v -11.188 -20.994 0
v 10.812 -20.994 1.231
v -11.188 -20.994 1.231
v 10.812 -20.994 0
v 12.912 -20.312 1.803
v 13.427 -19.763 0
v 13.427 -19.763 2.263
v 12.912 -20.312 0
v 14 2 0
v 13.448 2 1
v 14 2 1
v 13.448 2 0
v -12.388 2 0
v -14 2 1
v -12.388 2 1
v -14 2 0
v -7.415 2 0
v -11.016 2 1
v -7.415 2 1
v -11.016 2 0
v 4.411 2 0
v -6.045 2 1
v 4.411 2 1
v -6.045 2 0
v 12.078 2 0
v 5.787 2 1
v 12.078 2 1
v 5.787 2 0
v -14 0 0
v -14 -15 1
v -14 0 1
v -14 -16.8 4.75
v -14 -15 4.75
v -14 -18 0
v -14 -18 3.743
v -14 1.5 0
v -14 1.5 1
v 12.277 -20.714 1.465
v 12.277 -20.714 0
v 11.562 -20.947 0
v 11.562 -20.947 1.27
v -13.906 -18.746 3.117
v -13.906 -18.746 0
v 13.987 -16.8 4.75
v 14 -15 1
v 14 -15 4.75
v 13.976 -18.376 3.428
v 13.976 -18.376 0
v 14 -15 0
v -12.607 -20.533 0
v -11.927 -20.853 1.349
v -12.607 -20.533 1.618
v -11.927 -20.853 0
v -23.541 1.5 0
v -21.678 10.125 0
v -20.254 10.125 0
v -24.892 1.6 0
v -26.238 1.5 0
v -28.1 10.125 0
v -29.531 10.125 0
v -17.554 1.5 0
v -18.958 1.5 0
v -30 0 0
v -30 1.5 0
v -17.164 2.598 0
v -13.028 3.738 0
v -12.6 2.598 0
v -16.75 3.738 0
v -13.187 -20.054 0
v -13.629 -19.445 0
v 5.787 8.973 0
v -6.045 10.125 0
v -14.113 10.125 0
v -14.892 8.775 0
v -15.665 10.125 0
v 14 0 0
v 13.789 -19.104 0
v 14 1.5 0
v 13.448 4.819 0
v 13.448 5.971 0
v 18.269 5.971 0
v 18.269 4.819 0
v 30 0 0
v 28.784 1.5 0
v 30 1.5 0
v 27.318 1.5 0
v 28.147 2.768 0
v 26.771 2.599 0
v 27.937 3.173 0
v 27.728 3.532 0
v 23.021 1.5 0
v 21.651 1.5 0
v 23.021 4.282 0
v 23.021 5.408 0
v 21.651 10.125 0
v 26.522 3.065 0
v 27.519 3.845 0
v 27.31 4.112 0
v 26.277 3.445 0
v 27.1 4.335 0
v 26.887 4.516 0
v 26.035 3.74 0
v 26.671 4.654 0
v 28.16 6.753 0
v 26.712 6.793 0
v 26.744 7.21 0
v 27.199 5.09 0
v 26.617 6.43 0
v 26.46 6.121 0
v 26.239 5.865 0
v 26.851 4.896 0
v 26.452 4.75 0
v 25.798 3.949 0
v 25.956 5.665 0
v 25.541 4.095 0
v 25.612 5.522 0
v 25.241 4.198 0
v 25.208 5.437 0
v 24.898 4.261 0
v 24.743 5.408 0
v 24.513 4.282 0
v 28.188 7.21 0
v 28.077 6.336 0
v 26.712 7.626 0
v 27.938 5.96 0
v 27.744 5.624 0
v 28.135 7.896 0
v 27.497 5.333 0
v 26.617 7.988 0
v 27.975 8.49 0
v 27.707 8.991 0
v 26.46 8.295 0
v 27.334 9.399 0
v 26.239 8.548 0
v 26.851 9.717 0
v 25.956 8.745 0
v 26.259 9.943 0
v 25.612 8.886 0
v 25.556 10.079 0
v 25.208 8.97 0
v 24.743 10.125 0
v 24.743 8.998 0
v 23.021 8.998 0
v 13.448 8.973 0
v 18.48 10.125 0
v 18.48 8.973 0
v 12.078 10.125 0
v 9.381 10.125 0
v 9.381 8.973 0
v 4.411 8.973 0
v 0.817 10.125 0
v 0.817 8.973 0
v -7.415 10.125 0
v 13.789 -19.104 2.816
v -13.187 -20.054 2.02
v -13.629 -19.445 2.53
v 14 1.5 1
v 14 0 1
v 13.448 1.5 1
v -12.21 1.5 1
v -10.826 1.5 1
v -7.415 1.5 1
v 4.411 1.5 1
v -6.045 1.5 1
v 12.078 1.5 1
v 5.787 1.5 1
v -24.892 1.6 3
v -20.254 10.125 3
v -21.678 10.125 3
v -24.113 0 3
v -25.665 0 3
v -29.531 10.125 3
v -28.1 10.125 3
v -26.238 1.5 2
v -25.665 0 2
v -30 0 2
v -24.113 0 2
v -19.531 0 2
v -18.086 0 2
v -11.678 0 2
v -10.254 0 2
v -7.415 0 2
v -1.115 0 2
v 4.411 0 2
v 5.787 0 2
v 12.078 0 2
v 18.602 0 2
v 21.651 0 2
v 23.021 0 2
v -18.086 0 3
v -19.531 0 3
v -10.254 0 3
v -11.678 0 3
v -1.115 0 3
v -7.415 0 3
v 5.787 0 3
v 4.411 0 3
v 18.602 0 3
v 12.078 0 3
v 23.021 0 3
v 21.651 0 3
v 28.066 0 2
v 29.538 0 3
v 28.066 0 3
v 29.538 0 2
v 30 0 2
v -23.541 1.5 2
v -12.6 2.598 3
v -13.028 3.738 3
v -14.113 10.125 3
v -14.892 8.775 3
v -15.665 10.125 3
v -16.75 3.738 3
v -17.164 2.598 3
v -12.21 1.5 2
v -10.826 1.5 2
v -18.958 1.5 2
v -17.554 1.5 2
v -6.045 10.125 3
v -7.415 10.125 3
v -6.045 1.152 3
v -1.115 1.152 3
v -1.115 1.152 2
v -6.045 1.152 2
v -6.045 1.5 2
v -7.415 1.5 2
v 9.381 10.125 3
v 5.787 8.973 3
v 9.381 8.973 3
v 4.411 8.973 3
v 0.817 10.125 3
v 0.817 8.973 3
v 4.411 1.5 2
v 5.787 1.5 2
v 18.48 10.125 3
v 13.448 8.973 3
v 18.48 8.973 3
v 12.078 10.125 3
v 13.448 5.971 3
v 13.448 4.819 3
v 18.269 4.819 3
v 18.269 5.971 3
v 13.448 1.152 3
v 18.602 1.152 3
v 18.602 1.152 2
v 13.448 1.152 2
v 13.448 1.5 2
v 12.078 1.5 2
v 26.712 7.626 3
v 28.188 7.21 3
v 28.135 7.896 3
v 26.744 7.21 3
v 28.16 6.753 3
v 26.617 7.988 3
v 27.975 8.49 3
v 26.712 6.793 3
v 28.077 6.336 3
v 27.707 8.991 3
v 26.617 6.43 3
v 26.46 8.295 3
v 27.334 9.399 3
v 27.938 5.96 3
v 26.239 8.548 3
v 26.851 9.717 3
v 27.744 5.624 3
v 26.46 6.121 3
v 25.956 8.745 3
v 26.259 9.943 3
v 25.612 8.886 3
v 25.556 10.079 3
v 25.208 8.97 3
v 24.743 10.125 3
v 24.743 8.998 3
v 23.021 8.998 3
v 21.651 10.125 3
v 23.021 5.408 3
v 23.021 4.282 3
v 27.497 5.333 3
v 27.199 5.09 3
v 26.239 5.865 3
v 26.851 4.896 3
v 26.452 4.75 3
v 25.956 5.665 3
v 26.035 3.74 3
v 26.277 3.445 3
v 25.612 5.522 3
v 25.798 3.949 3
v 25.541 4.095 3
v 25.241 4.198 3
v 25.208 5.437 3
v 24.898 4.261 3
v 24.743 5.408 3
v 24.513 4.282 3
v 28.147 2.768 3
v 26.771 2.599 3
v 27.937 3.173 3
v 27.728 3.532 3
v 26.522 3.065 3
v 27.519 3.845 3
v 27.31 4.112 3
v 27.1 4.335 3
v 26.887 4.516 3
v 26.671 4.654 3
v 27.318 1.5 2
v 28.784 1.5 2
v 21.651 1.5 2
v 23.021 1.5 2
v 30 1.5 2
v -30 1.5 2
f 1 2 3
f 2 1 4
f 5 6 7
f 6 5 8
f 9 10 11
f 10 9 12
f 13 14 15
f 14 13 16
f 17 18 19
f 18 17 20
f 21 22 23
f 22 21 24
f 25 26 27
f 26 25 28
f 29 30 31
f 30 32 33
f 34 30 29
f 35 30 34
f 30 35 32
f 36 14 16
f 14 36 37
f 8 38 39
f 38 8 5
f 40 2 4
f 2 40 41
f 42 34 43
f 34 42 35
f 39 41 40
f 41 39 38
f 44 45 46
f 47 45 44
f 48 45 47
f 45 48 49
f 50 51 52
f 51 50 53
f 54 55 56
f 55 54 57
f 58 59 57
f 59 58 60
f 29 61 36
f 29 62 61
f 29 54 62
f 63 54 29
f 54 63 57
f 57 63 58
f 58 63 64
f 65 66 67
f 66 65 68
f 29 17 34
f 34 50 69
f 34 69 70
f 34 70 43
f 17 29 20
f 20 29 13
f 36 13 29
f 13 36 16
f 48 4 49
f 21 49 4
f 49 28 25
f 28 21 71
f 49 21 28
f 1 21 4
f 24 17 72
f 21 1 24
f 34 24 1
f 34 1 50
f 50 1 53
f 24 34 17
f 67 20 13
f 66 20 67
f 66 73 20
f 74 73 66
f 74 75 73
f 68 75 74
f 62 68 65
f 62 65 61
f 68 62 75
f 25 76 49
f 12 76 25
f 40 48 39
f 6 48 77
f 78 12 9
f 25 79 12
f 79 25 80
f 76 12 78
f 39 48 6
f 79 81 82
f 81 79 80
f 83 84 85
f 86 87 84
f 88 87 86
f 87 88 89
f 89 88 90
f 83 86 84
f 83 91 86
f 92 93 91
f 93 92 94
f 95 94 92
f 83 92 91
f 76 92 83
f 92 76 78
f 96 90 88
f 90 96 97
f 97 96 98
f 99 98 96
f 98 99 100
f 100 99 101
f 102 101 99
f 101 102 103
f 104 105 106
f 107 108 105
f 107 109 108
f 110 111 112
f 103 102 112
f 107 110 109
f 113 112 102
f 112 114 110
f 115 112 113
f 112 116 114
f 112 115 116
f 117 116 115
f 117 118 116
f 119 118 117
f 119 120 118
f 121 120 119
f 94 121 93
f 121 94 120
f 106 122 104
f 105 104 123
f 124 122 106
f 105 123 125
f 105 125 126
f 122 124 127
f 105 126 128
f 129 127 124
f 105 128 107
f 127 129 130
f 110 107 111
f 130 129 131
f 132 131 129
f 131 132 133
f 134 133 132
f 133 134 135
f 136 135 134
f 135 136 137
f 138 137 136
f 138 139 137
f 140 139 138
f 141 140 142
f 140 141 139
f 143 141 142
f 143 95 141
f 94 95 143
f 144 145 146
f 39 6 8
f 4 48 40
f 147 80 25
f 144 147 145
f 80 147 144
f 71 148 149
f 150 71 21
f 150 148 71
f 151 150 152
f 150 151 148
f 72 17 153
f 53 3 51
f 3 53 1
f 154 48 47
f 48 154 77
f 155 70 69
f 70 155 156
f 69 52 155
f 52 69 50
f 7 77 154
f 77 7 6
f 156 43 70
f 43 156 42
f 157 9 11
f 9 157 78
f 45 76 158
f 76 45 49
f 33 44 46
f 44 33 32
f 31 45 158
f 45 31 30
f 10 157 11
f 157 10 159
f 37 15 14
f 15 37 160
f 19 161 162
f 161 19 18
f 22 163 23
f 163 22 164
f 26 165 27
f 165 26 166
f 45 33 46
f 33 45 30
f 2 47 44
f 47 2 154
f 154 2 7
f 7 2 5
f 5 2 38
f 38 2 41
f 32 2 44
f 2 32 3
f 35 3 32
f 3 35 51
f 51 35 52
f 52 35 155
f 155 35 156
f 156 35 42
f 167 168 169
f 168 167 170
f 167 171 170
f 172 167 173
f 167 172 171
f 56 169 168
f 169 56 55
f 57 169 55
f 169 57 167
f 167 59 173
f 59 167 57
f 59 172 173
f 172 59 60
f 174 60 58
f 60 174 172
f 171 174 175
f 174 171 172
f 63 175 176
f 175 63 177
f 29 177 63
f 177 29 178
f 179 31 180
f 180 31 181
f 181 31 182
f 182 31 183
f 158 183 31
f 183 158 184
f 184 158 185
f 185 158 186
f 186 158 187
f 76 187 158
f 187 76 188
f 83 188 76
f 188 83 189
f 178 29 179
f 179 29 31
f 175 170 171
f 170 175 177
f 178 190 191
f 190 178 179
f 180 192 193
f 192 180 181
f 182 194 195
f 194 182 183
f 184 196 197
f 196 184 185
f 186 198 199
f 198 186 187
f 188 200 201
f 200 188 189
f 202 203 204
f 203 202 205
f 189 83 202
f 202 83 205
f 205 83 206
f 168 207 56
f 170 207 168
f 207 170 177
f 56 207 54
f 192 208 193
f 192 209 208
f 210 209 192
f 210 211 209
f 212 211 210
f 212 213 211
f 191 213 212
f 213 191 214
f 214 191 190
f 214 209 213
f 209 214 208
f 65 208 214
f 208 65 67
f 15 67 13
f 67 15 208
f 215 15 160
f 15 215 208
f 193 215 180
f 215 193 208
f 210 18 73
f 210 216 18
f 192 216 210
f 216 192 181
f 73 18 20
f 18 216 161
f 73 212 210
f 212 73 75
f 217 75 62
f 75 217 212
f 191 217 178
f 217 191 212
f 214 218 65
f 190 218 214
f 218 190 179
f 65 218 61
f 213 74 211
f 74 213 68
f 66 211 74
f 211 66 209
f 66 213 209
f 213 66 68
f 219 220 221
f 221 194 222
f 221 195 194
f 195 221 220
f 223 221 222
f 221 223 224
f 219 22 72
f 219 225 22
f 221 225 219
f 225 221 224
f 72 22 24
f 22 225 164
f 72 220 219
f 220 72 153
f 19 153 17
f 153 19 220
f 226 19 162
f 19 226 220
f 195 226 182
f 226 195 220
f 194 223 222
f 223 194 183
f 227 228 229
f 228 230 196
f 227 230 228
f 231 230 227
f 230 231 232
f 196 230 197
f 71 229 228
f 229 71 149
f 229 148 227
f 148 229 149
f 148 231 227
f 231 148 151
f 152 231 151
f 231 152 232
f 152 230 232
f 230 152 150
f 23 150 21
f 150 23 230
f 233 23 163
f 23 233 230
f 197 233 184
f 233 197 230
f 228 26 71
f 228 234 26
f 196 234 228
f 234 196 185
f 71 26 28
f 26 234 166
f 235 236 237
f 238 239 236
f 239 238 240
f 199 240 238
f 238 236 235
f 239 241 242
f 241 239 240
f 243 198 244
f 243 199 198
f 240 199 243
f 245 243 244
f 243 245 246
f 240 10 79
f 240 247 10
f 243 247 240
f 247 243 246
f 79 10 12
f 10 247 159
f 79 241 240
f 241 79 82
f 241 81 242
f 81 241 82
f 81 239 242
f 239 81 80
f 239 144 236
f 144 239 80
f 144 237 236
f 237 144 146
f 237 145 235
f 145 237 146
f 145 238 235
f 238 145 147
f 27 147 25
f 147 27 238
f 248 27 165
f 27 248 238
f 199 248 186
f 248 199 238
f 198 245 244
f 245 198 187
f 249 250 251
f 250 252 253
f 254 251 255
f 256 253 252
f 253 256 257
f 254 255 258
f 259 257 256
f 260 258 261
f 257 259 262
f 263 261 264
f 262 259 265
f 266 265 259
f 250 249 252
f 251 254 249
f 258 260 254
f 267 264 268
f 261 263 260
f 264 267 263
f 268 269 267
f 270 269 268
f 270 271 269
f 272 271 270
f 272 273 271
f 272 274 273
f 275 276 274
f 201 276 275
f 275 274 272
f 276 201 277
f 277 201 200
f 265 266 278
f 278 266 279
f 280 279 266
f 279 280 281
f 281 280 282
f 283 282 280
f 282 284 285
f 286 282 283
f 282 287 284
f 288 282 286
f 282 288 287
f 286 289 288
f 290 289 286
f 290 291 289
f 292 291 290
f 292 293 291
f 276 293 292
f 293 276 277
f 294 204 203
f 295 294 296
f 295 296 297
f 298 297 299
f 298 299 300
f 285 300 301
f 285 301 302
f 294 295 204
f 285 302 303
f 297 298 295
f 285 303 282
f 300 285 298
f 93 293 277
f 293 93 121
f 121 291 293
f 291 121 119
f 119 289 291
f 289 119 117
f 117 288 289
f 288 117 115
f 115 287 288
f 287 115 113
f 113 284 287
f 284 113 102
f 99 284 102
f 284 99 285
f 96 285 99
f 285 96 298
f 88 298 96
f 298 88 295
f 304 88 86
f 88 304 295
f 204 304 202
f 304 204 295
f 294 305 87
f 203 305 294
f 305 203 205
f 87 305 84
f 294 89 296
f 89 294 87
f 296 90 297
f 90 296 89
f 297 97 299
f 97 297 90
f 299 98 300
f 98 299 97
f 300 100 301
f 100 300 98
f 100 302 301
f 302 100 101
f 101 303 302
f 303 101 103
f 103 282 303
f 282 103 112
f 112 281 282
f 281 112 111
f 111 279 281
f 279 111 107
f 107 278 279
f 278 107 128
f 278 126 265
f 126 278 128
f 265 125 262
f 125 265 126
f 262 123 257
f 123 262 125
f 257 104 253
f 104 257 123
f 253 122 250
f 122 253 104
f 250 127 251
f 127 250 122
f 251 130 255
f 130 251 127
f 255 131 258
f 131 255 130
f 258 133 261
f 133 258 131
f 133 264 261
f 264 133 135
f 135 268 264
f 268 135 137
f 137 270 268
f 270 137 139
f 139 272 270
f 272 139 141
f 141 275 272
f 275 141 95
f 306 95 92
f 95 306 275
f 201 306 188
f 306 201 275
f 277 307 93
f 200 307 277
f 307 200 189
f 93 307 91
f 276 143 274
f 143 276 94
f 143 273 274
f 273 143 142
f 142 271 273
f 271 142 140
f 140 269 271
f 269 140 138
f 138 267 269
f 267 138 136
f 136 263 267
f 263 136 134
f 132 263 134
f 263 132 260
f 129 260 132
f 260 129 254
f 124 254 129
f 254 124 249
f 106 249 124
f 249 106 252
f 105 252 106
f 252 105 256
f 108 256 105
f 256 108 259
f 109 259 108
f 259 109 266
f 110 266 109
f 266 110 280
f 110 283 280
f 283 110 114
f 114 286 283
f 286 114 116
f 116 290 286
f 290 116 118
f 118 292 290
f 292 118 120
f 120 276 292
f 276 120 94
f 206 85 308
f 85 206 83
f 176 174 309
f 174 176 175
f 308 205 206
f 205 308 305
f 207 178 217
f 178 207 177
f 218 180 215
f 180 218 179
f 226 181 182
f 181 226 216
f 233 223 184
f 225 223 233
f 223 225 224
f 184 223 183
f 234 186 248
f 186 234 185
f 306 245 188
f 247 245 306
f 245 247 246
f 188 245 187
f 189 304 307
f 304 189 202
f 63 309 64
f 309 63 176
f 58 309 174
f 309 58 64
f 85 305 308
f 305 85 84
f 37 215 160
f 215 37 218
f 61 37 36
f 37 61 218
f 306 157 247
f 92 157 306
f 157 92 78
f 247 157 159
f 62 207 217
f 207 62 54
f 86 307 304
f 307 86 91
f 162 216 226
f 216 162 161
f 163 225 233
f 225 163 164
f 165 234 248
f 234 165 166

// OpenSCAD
//Hardhat accessory slot tab
//Writen by Dan Koss 1/2016. (Updated 1/23/16)
//Thanks to MC Geisler (thing:714444) for the font list. I'm still figuring out text and will trim don the list as I learn.
//Choose to import STL or Use custom text

/* [Add Text] */
//Text Line 1
line1 = "";
//Text Line 2
line2 = "";
//Text Line 3
line3 = "";
//Text Line 4
line4 = "VALTER";

//Font name, e.g. "Libration Sans", "Aldo", depends on what is available on the platform. In the customizer,choose from about 700 Google Fonts. For an overview please refer: http://www.google.com/fonts
FontName="Orbitron"; //[ABeeZee,Abel,Abril Fatface,Aclonica,Acme,Actor,Adamina,Advent Pro,Aguafina Script,Akronim,Aladin,Aldrich,Alef,Alegreya,Alegreya Sans,Alegreya Sans SC,Alegreya SC,Alex Brush,Alfa Slab One,Alice,Alike,Alike Angular,Allan,Allerta,Allerta Stencil,Allura,Almendra,Almendra Display,Almendra SC,Amarante,Amaranth,Amatic SC,Amethysta,Amiri,Anaheim,Andada,Andika,Angkor,Annie Use Your Telescope,Anonymous Pro,Antic,Antic Didone,Antic Slab,Anton,Arapey,Arbutus,Arbutus Slab,Architects Daughter,Archivo Black,Archivo Narrow,Arimo,Arizonia,Armata,Artifika,Arvo,Asap,Asset,Astloch,Asul,Atomic Age,Aubrey,Audiowide,Autour One,Average,Average Sans,Averia Gruesa Libre,Averia Libre,Averia Sans Libre,Averia Serif Libre,Bad Script,Balthazar,Bangers,Basic,Battambang,Baumans,Bayon,Belgrano,Belleza,BenchNine,Bentham,Berkshire Swash,Bevan,Bigelow Rules,Bigshot One,Bilbo,Bilbo Swash Caps,Bitter,Black Ops One,Bokor,Bonbon,Boogaloo,Bowlby One,Bowlby One SC,Brawler,Bree Serif,Bubblegum Sans,Bubbler One,Buda,Buenard,Butcherman,Butterfly Kids,Cabin,Cabin Condensed,Cabin Sketch,Caesar Dressing,Cagliostro,Calligraffitti,Cambay,Cambo,Candal,Cantarell,Cantata One,Cantora One,Capriola,Cardo,Carme,Carrois Gothic,Carrois Gothic SC,Carter One,Caudex,Cedarville Cursive,Ceviche One,Changa One,Chango,Chau Philomene One,Chela One,Chelsea Market,Chenla,Cherry Cream Soda,Cherry Swash,Chewy,Chicle,Chivo,Cinzel,Cinzel Decorative,Clicker Script,Coda,Coda Caption,Codystar,Combo,Comfortaa,Coming Soon,Concert One,Condiment,Content,Contrail One,Convergence,Cookie,Copse,Corben,Courgette,Cousine,Coustard,Covered By Your Grace,Crafty Girls,Creepster,Crete Round,Crimson Text,Croissant One,Crushed,Cuprum,Cutive,Cutive Mono,Damion,Dancing Script,Dangrek,Dawning of a New Day,Days One,Dekko,Delius,Delius Swash Caps,Delius Unicase,Della Respira,Denk One,Devonshire,Dhurjati,Didact Gothic,Diplomata,Diplomata SC,Domine,Donegal One,Doppio One,Dorsa,Dosis,Dr Sugiyama,Droid Sans,Droid Sans Mono,Droid Serif,Duru Sans,Dynalight,Eagle Lake,Eater,EB Garamond,Economica,Ek Mukta,Electrolize,Elsie,Elsie Swash Caps,Emblema One,Emilys Candy,Engagement,Englebert,Enriqueta,Erica One,Esteban,Euphoria Script,Ewert,Exo,Exo 2,Expletus Sans,Fanwood Text,Fascinate,Fascinate Inline,Faster One,Fasthand,Fauna One,Federant,Federo,Felipa,Fenix,Finger Paint,Fira Mono,Fira Sans,Fjalla One,Fjord One,Flamenco,Flavors,Fondamento,Fontdiner Swanky,Forum,Francois One,Freckle Face,Fredericka the Great,Fredoka One,Freehand,Fresca,Frijole,Fruktur,Fugaz One,Gabriela,Gafata,Galdeano,Galindo,Gentium Basic,Gentium Book Basic,Geo,Geostar,Geostar Fill,Germania One,GFS Didot,GFS Neohellenic,Gidugu,Gilda Display,Give You Glory,Glass Antiqua,Glegoo,Gloria Hallelujah,Goblin One,Gochi Hand,Gorditas,Goudy Bookletter 1911,Graduate,Grand Hotel,Gravitas One,Great Vibes,Griffy,Gruppo,Gudea,Gurajada,Habibi,Halant,Hammersmith One,Hanalei,Hanalei Fill,Handlee,Hanuman,Happy Monkey,Headland One,Henny Penny,Herr Von Muellerhoff,Hind,Holtwood One SC,Homemade Apple,Homenaje,Iceberg,Iceland,IM Fell Double Pica,IM Fell Double Pica SC,IM Fell DW Pica,IM Fell DW Pica SC,IM Fell English,IM Fell English SC,IM Fell French Canon,IM Fell French Canon SC,IM Fell Great Primer,IM Fell Great Primer SC,Imprima,Inconsolata,Inder,Indie Flower,Inika,Irish Grover,Istok Web,Italiana,Italianno,Jacques Francois,Jacques Francois Shadow,Jim Nightshade,Jockey One,Jolly Lodger,Josefin Sans,Josefin Slab,Joti One,Judson,Julee,Julius Sans One,Junge,Jura,Just Another Hand,Just Me Again Down Here,Kalam,Kameron,Kantumruy,Karla,Karma,Kaushan Script,Kavoon,Kdam Thmor,Keania One,Kelly Slab,Kenia,Khand,Khmer,Khula,Kite One,Knewave,Kotta One,Koulen,Kranky,Kreon,Kristi,Krona One,La Belle Aurore,Laila,Lakki Reddy,Lancelot,Lateef,Lato,League Script,Leckerli One,Ledger,Lekton,Lemon,Liberation Sans,Libre Baskerville,Life Savers,Lilita One,Lily Script One,Limelight,Linden Hill,Lobster,Lobster Two,Londrina Outline,Londrina Shadow,Londrina Sketch,Londrina Solid,Lora,Love Ya Like A Sister,Loved by the King,Lovers Quarrel,Luckiest Guy,Lusitana,Lustria,Macondo,Macondo Swash Caps,Magra,Maiden Orange,Mako,Mallanna,Mandali,Marcellus,Marcellus SC,Marck Script,Margarine,Marko One,Marmelad,Martel Sans,Marvel,Mate,Mate SC,Maven Pro,McLaren,Meddon,MedievalSharp,Medula One,Megrim,Meie Script,Merienda,Merienda One,Merriweather,Merriweather Sans,Metal,Metal Mania,Metamorphous,Metrophobic,Michroma,Milonga,Miltonian,Miltonian Tattoo,Miniver,Miss Fajardose,Modak,Modern Antiqua,Molengo,Molle,Monda,Monofett,Monoton,Monsieur La Doulaise,Montaga,Montez,Montserrat,Montserrat Alternates,Montserrat Subrayada,Moul,Moulpali,Mountains of Christmas,Mouse Memoirs,Mr Bedfort,Mr Dafoe,Mr De Haviland,Mrs Saint Delafield,Mrs Sheppards,Muli,Mystery Quest,Neucha,Neuton,New Rocker,News Cycle,Niconne,Nixie One,Nobile,Nokora,Norican,Nosifer,Nothing You Could Do,Noticia Text,Noto Sans,Noto Serif,Nova Cut,Nova Flat,Nova Mono,Nova Oval,Nova Round,Nova Script,Nova Slim,Nova Square,NTR,Numans,Nunito,Odor Mean Chey,Offside,Old Standard TT,Oldenburg,Oleo Script,Oleo Script Swash Caps,Open Sans,Open Sans Condensed,Oranienbaum,Orbitron,Oregano,Orienta,Original Surfer,Oswald,Over the Rainbow,Overlock,Overlock SC,Ovo,Oxygen,Oxygen Mono,Pacifico,Paprika,Parisienne,Passero One,Passion One,Pathway Gothic One,Patrick Hand,Patrick Hand SC,Patua One,Paytone One,Peddana,Peralta,Permanent Marker,Petit Formal Script,Petrona,Philosopher,Piedra,Pinyon Script,Pirata One,Plaster,Play,Playball,Playfair Display,Playfair Display SC,Podkova,Poiret One,Poller One,Poly,Pompiere,Pontano Sans,Port Lligat Sans,Port Lligat Slab,Prata,Preahvihear,Press Start 2P,Princess Sofia,Prociono,Prosto One,PT Mono,PT Sans,PT Sans Caption,PT Sans Narrow,PT Serif,PT Serif Caption,Puritan,Purple Purse,Quando,Quantico,Quattrocento,Quattrocento Sans,Questrial,Quicksand,Quintessential,Qwigley,Racing Sans One,Radley,Rajdhani,Raleway,Raleway Dots,Ramabhadra,Ramaraja,Rambla,Rammetto One,Ranchers,Rancho,Ranga,Rationale,Ravi Prakash,Redressed,Reenie Beanie,Revalia,Ribeye,Ribeye Marrow,Righteous,Risque,Roboto,Roboto Condensed,Roboto Slab,Rochester,Rock Salt,Rokkitt,Romanesco,Ropa Sans,Rosario,Rosarivo,Rouge Script,Rozha One,Rubik Mono One,Rubik One,Ruda,Rufina,Ruge Boogie,Ruluko,Rum Raisin,Ruslan Display,Russo One,Ruthie,Rye,Sacramento,Sail,Salsa,Sanchez,Sancreek,Sansita One,Sarina,Sarpanch,Satisfy,Scada,Scheherazade,Schoolbell,Seaweed Script,Sevillana,Seymour One,Shadows Into Light,Shadows Into Light Two,Shanti,Share,Share Tech,Share Tech Mono,Shojumaru,Short Stack,Siemreap,Sigmar One,Signika,Signika Negative,Simonetta,Sintony,Sirin Stencil,Six Caps,Skranji,Slabo 13px,Slabo 27px,Slackey,Smokum,Smythe,Sniglet,Snippet,Snowburst One,Sofadi One,Sofia,Sonsie One,Sorts Mill Goudy,Source Code Pro,Source Sans Pro,Source Serif Pro,Special Elite,Spicy Rice,Spinnaker,Spirax,Squada One,Sree Krushnadevaraya,Stalemate,Stalinist One,Stardos Stencil,Stint Ultra Condensed,Stint Ultra Expanded,Stoke,Strait,Sue Ellen Francisco,Sunshiney,Supermercado One,Suranna,Suravaram,Suwannaphum,Swanky and Moo Moo,Syncopate,Tangerine,Taprom,Tauri,Teko,Telex,Tenali Ramakrishna,Tenor Sans,Text Me One,The Girl Next Door,Tienne,Timmana,Tinos,Titan One,Titillium Web,Trade Winds,Trocchi,Trochut,Trykker,Tulpen One,Ubuntu,Ubuntu Condensed,Ubuntu Mono,Ultra,Uncial Antiqua,Underdog,Unica One,UnifrakturCook,UnifrakturMaguntia,Unkempt,Unlock,Unna,Vampiro One,Varela,Varela Round,Vast Shadow,Vesper Libre,Vibur,Vidaloka,Viga,Voces,Volkhov,Vollkorn,Voltaire,VT323,Waiting for the Sunrise,Wallpoet,Walter Turncoat,Warnes,Wellfleet,Wendy One,Wire One,Yanone Kaffeesatz,Yellowtail,Yeseva One,Yesteryear,Zeyada]
//Font Size
FontSize = 10; //[1:.5:30]
//Font Spacing
FontSpace = 1; //[0:.1:2]
//Font Extrusion;
FontExtrude = 3; //[1:.1:10]
//Line Spacing
LineSpace = 1.1; //[0:.1:2]


/* [Hidden] */
stlortext = "text";

//The following is to import an STL File. Change "stlortext" to ="stl"
//and copy the STL file to the same folder as your .scad file
stlfile = "koss_insert.stl";
//Shift STL [x,y,z]
stlshift = [0,9,0];
//Scale STL [x,y,z] axis
stlscale = [1,1,1];
//Rotate STL about [x,y,z] axis
stlrotate = [0,0,0];

/* [Hidden] */
//Referenced constants for the TAB.
//Tshiftx = 15;
tabX = 28;
tabY = 15;
tabZ = 4.75;
tabHead = 2;
tabClip = 6;
rad=tabClip/2;

if (stlortext == "stl") {
    union(){
        translate([stlshift[0],stlshift[1],stlshift[2]]) scale([stlscale[0],stlscale[1],stlscale[2]]) rotate([stlrotate[0],stlrotate[1],stlrotate[2]]) import(stlfile);
        TAB();
    }
}
else if (stlortext == "text") {TextClip();}
else echo("error");


//
//Add Text. Line 4 at bottom and Line 1 at the Top
module TextClip (){
    union(){
        TAB();
        len_text = len(line4);
        translate([-((len_text)/2)*FontSize*FontSpace,0,0]) WriteText(line4,FontSize);
        translate([-((len_text)/2)*FontSize*FontSpace,0,0]) cube([(len_text)*FontSize*FontSpace,1.5,2]);
        
        if (line3 != "") {
            len_text = len(line3);
            translate([-((len_text)/2)*FontSize*FontSpace,FontSize*LineSpace,0]) WriteText(line3,FontSize);
            translate([-((len_text)/2)*FontSize*FontSpace,FontSize*LineSpace-1,0]) cube([(len_text)*FontSize*FontSpace,1.5+1+(FontSize*(LineSpace-1)),2]);
        }
        
        if (line2 != "") {
            len_text = len(line2);
            translate([-((len_text)/2)*FontSize*FontSpace,2*FontSize*LineSpace,0]) WriteText(line2, FontSize);
            translate([-((len_text)/2)*FontSize*FontSpace,2*(FontSize*LineSpace-1),0]) cube([(len_text)*FontSize*FontSpace,1.5+1+(FontSize*(LineSpace-1)),1]);
        }
        
        if (line1 != "") {
            len_text = len(line1);
            translate([-((len_text)/2)*FontSize*FontSpace,3*FontSize*LineSpace,0]) WriteText(line1,FontSize);
            translate([-((len_text)/2)*FontSize*FontSpace,3*(FontSize*LineSpace-1),0]) cube([(len_text)*FontSize*FontSpace,1.5+1+(FontSize*(LineSpace-1)),1]);
        }
    }
}


module WriteText (textstring, fontsize){
    len_text = len(textstring);
    for (i=[0:1:(len_text-1)]) {
        if(textstring[i]=="i"){
            translate([((i+.5)*FontSpace*FontSize),0,0]) HighDots(textstring[i]);
        }
        else if(textstring[i]=="j"){
            translate([((i+.5)*FontSpace*FontSize),0,0]) HighDots(textstring[i]);
        }
        else if(textstring[i]=="?"){
            translate([((i+.5)*FontSpace*FontSize),0,0]) LowDots(textstring[i]);
        }
        else if(textstring[i]=="!"){
            translate([((i+.5)*FontSpace*FontSize),0,0]) LowDots(textstring[i]);
        }
        else if(textstring[i]==":"){
            translate([((i+.5)*FontSpace*FontSize),0,0]) LowDots(textstring[i]);
        }
        else if(textstring[i]==";"){
            translate([((i+.5)*FontSpace*FontSize),0,0]) LowDots(textstring[i]);
        }
        else {
            translate([((i+.5)*FontSpace*FontSize),0,0]) {
            linear_extrude(height=FontExtrude,convexity=10)
                text(textstring[i],size=FontSize,font=FontName,halign="center",valign="baseline");
            }
        }
    }
}
module HighDots(letter){
     union(){
         translate([0,0,0]) hull(){
             difference(){
                linear_extrude(1) text(letter,size=FontSize,font=FontName,halign="center",valign="baseline");
                translate([-FontSize/2,-(FontSize)/3,-0.5]) cube([FontSize,FontSize,2]);
             }
         }
         linear_extrude(height=FontExtrude,convexity=10)
            text(letter,size=FontSize,font=FontName,halign="center",valign="baseline");
        }
}
 module LowDots(letter){
     union(){
         translate([0,0,0]) hull(){
             difference(){
                 linear_extrude(1) text(letter,size=FontSize,font=FontName,halign="center",valign="baseline");
                 translate([-FontSize/2,FontSize/3,-0.5]) cube([FontSize,FontSize,5]);
             }
         }
         linear_extrude(height=FontExtrude,convexity=10)
            text(letter,size=FontSize,font=FontName,halign="center",valign="baseline");
        }
}
 
//
//Draw the tab.
module TAB (){
    rotate([0,0,180]) difference(){
        hull(){ //outer shell
            translate([-tabX/2,0,0]) cube([tabX,tabY,tabZ]);
            translate([-tabX/2,-tabHead,0]) cube([tabX,tabHead,tabZ]);
            translate([-((tabX/2)-rad),tabY+tabClip-rad,0]) cylinder(h=tabZ, r=rad, $fn=25);
            translate([((tabX/2)-rad),tabY+tabClip-rad,0]) cylinder(h=tabZ, r=rad, $fn=25);
        }
        translate([-(tabX*1.1)/2,-tabHead-.1,1]) cube(size=[tabX*1.1,tabY+tabHead+.1,tabZ]);
        translate([-(tabX*1.1)/2,tabY+(0.3*tabClip),tabZ]) rotate([-40,0,0]) cube([tabX*1.1,10,5]);
    }
}
